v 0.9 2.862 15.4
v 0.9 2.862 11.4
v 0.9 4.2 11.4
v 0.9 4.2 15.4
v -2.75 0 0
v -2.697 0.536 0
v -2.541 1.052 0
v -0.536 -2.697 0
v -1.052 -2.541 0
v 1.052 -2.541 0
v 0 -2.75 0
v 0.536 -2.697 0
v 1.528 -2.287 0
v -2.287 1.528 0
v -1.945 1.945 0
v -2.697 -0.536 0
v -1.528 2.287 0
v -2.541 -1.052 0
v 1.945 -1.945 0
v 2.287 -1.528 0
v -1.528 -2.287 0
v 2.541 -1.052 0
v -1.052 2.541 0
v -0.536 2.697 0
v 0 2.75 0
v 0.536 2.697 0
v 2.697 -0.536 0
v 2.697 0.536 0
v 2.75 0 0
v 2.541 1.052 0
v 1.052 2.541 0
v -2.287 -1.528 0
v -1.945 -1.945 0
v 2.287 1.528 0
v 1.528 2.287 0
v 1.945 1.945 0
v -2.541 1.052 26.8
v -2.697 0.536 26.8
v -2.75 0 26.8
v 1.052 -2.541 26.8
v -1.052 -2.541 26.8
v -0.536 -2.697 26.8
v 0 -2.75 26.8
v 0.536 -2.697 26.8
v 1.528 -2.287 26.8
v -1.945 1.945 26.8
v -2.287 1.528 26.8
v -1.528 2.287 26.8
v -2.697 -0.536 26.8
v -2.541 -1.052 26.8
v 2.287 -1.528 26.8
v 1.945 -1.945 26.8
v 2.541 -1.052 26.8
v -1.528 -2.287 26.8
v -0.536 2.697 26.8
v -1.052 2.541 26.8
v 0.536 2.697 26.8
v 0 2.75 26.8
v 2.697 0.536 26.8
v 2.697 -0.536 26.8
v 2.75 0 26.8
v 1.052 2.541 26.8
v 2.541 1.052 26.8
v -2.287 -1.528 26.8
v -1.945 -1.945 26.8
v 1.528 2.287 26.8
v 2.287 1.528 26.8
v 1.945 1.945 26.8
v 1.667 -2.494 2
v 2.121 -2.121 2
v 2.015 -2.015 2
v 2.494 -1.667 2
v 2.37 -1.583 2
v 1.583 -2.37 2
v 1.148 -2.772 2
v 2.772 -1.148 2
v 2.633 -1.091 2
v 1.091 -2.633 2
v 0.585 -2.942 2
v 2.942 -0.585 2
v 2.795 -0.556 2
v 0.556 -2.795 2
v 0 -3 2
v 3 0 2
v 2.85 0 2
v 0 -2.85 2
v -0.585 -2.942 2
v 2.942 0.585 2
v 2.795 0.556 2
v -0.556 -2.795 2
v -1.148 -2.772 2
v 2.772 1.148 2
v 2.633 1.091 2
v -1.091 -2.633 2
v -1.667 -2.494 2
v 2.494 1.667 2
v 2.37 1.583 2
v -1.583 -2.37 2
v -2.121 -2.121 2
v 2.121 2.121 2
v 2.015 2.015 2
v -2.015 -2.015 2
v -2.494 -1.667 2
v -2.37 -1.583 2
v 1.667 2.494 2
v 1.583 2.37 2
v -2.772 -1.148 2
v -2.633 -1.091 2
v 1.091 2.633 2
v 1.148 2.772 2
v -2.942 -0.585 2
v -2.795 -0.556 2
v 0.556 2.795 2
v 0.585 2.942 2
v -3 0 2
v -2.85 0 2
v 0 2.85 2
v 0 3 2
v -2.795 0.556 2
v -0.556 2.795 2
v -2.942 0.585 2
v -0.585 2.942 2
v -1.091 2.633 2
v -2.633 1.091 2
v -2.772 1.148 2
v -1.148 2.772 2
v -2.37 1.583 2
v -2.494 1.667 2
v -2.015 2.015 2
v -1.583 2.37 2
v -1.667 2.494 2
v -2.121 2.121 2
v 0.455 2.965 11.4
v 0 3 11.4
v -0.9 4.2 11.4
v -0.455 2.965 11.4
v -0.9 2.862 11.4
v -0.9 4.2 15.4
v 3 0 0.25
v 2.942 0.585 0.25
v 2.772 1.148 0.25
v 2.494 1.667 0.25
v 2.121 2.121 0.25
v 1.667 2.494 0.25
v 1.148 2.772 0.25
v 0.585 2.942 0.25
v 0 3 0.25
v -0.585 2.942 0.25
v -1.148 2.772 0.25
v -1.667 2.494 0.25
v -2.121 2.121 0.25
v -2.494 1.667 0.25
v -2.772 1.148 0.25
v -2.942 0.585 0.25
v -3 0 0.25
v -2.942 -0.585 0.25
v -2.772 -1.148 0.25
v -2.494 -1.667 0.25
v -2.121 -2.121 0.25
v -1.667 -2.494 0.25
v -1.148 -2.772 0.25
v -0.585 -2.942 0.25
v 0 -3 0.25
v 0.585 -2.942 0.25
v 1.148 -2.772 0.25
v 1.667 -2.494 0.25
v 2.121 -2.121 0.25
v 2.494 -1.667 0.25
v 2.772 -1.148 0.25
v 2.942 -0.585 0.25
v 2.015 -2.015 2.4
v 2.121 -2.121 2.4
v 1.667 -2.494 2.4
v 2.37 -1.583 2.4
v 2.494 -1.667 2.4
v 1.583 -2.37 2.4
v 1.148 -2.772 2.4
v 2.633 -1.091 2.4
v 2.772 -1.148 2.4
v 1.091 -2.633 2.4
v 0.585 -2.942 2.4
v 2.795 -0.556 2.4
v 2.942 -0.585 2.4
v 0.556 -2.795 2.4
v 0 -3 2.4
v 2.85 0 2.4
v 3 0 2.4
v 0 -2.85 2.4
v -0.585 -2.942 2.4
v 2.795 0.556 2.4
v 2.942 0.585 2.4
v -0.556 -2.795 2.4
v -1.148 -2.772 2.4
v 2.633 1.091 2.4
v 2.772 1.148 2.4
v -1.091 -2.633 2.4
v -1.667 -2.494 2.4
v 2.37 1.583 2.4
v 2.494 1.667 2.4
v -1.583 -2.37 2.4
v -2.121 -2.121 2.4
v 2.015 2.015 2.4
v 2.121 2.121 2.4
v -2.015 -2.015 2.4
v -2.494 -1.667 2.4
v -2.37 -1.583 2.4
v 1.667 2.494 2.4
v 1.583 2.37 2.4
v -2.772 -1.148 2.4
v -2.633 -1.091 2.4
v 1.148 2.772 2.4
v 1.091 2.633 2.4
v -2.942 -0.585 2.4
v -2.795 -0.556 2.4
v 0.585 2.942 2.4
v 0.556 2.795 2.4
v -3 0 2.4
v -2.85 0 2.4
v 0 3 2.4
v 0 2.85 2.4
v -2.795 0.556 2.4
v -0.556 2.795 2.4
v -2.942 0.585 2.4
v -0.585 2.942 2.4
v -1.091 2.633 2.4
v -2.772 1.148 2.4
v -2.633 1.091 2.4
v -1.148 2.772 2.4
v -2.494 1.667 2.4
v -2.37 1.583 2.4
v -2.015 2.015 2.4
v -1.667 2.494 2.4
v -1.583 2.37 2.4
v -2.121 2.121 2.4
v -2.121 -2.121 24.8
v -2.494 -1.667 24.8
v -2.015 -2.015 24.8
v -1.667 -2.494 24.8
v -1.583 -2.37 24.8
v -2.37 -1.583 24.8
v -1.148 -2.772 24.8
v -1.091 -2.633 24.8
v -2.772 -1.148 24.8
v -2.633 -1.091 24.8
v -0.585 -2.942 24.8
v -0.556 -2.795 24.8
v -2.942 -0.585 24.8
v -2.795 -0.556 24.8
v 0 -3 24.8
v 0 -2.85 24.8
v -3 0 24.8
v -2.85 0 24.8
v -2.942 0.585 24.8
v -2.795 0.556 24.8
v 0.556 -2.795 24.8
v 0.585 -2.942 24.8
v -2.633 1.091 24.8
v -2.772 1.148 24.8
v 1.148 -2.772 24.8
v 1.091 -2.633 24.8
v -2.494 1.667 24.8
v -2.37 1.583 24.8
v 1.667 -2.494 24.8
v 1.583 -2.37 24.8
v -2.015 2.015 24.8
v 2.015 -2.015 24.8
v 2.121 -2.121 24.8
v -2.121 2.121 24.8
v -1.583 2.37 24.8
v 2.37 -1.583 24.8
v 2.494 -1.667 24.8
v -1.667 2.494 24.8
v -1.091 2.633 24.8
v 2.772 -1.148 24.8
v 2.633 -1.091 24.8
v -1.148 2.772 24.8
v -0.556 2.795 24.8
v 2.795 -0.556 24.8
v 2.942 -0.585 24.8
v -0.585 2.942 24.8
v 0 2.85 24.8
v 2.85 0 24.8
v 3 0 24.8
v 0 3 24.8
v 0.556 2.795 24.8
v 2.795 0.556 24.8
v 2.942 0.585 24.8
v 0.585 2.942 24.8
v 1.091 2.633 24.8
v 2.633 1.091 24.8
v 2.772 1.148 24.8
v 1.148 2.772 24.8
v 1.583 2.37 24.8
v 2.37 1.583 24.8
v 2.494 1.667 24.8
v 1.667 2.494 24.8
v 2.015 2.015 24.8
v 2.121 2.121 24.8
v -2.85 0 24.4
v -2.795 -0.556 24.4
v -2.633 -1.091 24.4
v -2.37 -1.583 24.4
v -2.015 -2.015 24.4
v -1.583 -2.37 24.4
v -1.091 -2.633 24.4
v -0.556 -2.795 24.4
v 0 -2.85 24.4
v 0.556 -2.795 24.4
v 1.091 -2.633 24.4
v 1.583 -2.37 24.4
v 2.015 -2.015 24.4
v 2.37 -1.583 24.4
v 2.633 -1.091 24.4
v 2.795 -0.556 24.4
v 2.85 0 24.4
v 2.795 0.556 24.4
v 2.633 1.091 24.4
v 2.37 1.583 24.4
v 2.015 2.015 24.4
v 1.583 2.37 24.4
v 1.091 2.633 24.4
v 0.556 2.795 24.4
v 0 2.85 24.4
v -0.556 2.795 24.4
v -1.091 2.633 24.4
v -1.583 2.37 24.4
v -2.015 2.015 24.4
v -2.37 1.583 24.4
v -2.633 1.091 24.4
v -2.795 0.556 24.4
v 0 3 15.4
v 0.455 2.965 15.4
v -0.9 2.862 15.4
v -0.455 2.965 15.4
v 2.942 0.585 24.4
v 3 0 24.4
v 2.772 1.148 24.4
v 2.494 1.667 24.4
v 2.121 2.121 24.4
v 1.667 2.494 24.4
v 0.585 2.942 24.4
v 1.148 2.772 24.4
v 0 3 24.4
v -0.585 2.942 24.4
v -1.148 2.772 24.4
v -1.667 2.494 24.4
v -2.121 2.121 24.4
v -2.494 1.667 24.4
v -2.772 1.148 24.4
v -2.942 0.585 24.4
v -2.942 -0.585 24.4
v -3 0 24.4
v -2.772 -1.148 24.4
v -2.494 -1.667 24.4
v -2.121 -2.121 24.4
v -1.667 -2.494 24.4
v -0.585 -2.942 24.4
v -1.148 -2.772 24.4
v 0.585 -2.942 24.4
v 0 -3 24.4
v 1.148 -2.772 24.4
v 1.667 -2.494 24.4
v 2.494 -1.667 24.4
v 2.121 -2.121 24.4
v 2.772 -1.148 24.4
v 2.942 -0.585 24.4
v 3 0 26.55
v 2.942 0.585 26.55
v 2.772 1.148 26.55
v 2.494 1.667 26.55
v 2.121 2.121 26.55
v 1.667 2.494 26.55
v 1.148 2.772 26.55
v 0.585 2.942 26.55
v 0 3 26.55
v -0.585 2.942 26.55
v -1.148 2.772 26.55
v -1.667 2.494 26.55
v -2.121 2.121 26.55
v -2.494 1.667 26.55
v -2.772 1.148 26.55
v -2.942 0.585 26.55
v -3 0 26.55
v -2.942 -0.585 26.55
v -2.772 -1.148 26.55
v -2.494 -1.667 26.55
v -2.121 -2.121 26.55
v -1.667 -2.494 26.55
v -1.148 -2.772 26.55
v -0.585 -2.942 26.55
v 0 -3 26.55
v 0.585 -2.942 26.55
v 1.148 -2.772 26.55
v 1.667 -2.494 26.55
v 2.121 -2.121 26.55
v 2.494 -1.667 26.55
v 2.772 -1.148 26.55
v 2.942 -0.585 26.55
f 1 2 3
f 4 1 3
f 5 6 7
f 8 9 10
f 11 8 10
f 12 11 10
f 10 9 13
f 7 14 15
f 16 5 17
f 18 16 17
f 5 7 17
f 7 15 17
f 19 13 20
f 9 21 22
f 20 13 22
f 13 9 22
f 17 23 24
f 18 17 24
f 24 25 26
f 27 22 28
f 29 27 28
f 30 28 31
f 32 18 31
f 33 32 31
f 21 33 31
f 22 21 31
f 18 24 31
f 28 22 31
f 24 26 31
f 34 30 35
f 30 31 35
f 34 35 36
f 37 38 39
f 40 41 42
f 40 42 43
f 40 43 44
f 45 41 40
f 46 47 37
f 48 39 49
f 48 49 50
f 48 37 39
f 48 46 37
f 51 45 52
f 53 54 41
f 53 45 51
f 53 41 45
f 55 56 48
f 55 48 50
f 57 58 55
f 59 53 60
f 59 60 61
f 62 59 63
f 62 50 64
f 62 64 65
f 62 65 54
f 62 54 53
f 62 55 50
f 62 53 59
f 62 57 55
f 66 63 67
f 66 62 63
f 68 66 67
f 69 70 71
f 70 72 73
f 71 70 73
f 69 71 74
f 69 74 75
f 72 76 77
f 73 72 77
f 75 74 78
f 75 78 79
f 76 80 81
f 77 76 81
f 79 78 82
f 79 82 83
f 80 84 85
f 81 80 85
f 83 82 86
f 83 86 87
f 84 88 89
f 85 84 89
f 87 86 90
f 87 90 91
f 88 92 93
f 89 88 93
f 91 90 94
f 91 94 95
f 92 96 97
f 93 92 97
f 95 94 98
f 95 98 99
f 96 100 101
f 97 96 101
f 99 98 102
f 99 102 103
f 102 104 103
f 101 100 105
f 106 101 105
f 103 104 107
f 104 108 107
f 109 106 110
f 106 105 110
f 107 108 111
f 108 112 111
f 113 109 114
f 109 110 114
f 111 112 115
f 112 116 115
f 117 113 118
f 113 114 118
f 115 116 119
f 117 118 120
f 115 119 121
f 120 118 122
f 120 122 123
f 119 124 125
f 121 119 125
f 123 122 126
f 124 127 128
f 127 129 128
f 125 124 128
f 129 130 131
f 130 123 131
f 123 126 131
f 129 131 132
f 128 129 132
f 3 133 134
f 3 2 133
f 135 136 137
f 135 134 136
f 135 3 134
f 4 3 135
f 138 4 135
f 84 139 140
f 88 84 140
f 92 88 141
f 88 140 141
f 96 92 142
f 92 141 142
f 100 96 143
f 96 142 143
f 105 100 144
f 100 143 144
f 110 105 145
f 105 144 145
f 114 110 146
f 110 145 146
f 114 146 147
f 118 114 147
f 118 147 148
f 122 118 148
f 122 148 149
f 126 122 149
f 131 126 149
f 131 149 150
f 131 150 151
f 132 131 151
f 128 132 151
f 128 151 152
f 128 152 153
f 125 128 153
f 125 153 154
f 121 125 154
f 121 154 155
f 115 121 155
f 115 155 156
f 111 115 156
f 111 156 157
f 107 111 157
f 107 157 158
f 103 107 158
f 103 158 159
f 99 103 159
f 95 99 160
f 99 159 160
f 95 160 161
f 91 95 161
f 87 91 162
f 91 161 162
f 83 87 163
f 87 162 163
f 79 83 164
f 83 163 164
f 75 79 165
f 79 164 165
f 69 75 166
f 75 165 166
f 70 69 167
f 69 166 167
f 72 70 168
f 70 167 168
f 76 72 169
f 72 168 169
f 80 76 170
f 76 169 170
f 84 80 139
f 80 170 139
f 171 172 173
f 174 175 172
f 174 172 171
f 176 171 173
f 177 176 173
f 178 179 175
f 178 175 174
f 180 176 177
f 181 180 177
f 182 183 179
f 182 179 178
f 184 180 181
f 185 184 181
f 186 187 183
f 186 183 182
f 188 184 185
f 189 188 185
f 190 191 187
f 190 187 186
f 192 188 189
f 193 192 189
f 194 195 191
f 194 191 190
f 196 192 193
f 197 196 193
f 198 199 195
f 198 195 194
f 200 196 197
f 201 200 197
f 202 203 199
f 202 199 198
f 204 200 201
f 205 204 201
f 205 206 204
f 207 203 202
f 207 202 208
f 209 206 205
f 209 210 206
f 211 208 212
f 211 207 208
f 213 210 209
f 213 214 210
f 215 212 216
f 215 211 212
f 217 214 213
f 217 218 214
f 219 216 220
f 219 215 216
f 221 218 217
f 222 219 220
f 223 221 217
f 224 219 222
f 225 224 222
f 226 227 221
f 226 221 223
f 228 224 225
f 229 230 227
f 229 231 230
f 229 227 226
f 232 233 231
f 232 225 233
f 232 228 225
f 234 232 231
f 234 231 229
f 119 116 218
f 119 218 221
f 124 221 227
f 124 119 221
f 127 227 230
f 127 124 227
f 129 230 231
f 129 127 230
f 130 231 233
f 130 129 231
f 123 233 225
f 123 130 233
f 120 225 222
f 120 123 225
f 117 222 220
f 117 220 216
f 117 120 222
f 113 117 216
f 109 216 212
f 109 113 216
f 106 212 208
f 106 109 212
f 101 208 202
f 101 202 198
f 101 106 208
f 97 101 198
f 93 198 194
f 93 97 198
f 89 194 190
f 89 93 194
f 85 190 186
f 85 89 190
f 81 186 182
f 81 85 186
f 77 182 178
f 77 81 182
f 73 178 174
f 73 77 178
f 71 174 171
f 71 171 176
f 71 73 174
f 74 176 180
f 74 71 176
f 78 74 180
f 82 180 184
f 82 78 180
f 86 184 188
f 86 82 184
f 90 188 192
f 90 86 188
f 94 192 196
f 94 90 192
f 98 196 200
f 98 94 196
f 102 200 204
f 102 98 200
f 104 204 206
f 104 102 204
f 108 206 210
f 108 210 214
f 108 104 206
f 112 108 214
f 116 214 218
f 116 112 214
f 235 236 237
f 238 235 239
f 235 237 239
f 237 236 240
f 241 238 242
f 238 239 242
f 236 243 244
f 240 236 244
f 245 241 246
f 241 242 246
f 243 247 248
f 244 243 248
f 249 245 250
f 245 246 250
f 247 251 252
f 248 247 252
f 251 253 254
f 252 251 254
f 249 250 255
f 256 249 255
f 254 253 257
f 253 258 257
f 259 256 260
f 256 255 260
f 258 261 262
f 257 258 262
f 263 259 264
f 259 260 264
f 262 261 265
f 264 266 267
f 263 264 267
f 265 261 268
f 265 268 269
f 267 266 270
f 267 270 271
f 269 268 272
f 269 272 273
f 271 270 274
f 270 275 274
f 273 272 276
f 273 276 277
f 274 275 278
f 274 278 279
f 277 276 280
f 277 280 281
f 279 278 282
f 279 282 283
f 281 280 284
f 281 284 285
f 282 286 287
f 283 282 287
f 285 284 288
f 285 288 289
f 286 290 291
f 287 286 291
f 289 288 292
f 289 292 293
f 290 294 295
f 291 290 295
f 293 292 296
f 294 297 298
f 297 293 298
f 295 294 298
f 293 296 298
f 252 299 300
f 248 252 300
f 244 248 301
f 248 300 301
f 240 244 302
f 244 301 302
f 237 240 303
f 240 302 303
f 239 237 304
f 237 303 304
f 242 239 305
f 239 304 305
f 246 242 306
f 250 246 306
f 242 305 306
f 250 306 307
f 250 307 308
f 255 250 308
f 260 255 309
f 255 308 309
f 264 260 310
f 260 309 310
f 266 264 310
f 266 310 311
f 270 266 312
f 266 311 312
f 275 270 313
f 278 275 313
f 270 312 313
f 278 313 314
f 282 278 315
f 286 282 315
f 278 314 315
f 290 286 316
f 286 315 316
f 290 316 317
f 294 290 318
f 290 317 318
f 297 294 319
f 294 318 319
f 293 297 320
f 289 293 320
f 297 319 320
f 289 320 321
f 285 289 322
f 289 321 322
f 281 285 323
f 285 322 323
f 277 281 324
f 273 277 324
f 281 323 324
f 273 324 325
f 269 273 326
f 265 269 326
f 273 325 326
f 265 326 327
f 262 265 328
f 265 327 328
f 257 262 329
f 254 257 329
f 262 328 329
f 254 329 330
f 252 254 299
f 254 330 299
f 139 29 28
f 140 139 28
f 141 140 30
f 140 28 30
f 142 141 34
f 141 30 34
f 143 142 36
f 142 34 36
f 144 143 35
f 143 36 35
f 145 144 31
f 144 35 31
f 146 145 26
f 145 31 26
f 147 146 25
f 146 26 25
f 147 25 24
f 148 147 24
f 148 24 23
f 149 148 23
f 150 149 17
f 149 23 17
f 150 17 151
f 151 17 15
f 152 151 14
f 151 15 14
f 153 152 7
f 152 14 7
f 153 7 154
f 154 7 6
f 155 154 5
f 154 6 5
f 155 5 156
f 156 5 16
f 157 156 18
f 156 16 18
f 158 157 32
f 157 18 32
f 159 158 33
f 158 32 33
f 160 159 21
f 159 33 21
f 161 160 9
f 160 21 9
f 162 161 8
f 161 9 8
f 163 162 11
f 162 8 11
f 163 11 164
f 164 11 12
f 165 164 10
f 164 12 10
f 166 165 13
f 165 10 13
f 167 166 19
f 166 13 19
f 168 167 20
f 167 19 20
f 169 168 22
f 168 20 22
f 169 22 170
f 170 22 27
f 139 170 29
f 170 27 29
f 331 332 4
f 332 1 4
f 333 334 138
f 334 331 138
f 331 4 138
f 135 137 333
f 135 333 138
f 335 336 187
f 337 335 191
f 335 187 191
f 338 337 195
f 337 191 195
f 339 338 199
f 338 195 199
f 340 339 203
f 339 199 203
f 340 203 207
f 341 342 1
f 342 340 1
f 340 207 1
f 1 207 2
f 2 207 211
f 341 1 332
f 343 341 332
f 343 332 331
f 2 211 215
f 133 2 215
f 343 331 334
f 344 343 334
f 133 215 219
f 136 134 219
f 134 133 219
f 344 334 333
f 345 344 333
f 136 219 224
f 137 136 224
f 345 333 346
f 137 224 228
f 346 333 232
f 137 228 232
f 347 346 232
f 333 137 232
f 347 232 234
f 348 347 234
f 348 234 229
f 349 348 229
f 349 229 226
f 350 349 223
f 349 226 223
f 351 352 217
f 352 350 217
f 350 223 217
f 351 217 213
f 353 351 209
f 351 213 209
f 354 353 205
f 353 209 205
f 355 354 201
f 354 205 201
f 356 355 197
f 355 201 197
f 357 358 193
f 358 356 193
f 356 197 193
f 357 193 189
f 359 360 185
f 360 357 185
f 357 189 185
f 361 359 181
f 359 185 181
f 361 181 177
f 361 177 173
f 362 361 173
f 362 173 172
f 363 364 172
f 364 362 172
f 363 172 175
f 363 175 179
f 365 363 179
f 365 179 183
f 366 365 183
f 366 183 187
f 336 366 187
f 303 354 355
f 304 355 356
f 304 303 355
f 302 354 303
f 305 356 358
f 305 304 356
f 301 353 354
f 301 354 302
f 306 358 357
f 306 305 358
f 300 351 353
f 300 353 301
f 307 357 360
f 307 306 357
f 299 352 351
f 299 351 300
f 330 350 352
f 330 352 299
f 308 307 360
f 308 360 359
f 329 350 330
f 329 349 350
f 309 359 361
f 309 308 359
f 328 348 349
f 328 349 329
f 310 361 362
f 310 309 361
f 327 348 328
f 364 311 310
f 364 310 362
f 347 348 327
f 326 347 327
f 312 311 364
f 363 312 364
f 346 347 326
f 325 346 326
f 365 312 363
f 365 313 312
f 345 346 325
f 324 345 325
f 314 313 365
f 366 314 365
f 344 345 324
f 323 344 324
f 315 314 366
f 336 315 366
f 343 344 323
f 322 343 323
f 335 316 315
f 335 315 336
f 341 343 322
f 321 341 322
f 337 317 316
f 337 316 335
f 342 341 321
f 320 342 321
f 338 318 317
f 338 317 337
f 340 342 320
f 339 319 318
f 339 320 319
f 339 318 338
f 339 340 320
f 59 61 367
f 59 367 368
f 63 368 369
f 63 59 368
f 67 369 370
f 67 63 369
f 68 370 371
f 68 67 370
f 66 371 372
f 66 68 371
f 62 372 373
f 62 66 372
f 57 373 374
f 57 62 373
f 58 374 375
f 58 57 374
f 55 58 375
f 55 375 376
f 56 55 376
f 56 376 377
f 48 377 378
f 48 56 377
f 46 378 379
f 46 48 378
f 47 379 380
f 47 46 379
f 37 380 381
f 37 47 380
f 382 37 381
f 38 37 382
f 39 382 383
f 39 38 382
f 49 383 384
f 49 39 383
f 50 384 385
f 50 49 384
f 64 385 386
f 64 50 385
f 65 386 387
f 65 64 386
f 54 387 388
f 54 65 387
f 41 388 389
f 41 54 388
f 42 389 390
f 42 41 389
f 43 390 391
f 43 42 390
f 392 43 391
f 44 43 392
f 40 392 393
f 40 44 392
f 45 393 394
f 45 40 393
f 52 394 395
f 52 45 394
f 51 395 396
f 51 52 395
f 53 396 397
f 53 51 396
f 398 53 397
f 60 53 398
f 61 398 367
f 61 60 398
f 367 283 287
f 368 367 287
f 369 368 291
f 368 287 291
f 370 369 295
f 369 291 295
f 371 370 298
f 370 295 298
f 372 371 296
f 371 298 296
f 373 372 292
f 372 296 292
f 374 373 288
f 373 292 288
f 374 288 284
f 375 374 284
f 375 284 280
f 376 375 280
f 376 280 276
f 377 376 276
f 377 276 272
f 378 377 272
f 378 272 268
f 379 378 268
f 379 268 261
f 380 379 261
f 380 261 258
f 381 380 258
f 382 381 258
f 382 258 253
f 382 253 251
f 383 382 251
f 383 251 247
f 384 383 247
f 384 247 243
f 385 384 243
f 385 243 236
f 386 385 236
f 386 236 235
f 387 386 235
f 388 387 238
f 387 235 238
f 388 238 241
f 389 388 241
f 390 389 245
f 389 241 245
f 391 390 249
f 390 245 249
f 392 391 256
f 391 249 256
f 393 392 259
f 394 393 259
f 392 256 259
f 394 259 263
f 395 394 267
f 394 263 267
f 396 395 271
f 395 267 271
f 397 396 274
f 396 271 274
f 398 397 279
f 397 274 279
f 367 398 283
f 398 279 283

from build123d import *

# Parameters (mm, degrees)
SKETCH1_R           = 3
BOSS_EXTRUDE1_DEPTH = 26.8
BOSS_EXTRUDE2_START = -11.4
SKETCH2_W           = 1.8
SKETCH2_H           = 4.2
BOSS_EXTRUDE2_DEPTH = 4
CUT_EXTRUDE1_START  = -2
SKETCH3_R           = 3
SKETCH3_R_2         = 2.85
CUT_EXTRUDE1_DEPTH  = 0.4
CUT_EXTRUDE2_START  = -2.4
SKETCH4_R           = 3.000966843
SKETCH4_R_2         = 2.85
CUT_EXTRUDE2_DEPTH  = 0.4
CHAMFER1_SIZE       = 0.25


with BuildPart() as part:
    # Sketch1 → Boss-Extrude1 (new body)
    with BuildSketch(Plane.XY):
        Circle(SKETCH1_R)
    extrude(amount=BOSS_EXTRUDE1_DEPTH)

    # Sketch2 → Boss-Extrude2 (add)
    with BuildSketch(Plane(origin=(0, 0, 0), x_dir=(-1, 0, 0), z_dir=(0, 0, -1)).offset(BOSS_EXTRUDE2_START)):
        with Locations((0, 2.1)):
            Rectangle(SKETCH2_W, SKETCH2_H)
    extrude(amount=-BOSS_EXTRUDE2_DEPTH)

    # Sketch3 → Cut-Extrude1 (cut)
    with BuildSketch(Plane(origin=(0, 0, 0), x_dir=(-1, 0, 0), z_dir=(0, 0, -1)).offset(CUT_EXTRUDE1_START)):
        Circle(SKETCH3_R)
        Circle(SKETCH3_R_2, mode=Mode.SUBTRACT)
    extrude(amount=-CUT_EXTRUDE1_DEPTH, mode=Mode.SUBTRACT)

    # Sketch4 → Cut-Extrude2 (cut)
    with BuildSketch(Plane.XY.offset(26.8).offset(CUT_EXTRUDE2_START)):
        Circle(SKETCH4_R)
        with Locations(Location((0, 0, 0), (0, 0, 180))):
            Circle(SKETCH4_R_2, mode=Mode.SUBTRACT)
    extrude(amount=CUT_EXTRUDE2_DEPTH, mode=Mode.SUBTRACT)

    # Chamfer1
    chamfer1_edges = [part.edges().sort_by_distance(p)[0] for p in [
        (-3, 0, 0),
        (-3, 0, 26.8),
    ]]
    chamfer(chamfer1_edges, length=CHAMFER1_SIZE)


solid = part.part
